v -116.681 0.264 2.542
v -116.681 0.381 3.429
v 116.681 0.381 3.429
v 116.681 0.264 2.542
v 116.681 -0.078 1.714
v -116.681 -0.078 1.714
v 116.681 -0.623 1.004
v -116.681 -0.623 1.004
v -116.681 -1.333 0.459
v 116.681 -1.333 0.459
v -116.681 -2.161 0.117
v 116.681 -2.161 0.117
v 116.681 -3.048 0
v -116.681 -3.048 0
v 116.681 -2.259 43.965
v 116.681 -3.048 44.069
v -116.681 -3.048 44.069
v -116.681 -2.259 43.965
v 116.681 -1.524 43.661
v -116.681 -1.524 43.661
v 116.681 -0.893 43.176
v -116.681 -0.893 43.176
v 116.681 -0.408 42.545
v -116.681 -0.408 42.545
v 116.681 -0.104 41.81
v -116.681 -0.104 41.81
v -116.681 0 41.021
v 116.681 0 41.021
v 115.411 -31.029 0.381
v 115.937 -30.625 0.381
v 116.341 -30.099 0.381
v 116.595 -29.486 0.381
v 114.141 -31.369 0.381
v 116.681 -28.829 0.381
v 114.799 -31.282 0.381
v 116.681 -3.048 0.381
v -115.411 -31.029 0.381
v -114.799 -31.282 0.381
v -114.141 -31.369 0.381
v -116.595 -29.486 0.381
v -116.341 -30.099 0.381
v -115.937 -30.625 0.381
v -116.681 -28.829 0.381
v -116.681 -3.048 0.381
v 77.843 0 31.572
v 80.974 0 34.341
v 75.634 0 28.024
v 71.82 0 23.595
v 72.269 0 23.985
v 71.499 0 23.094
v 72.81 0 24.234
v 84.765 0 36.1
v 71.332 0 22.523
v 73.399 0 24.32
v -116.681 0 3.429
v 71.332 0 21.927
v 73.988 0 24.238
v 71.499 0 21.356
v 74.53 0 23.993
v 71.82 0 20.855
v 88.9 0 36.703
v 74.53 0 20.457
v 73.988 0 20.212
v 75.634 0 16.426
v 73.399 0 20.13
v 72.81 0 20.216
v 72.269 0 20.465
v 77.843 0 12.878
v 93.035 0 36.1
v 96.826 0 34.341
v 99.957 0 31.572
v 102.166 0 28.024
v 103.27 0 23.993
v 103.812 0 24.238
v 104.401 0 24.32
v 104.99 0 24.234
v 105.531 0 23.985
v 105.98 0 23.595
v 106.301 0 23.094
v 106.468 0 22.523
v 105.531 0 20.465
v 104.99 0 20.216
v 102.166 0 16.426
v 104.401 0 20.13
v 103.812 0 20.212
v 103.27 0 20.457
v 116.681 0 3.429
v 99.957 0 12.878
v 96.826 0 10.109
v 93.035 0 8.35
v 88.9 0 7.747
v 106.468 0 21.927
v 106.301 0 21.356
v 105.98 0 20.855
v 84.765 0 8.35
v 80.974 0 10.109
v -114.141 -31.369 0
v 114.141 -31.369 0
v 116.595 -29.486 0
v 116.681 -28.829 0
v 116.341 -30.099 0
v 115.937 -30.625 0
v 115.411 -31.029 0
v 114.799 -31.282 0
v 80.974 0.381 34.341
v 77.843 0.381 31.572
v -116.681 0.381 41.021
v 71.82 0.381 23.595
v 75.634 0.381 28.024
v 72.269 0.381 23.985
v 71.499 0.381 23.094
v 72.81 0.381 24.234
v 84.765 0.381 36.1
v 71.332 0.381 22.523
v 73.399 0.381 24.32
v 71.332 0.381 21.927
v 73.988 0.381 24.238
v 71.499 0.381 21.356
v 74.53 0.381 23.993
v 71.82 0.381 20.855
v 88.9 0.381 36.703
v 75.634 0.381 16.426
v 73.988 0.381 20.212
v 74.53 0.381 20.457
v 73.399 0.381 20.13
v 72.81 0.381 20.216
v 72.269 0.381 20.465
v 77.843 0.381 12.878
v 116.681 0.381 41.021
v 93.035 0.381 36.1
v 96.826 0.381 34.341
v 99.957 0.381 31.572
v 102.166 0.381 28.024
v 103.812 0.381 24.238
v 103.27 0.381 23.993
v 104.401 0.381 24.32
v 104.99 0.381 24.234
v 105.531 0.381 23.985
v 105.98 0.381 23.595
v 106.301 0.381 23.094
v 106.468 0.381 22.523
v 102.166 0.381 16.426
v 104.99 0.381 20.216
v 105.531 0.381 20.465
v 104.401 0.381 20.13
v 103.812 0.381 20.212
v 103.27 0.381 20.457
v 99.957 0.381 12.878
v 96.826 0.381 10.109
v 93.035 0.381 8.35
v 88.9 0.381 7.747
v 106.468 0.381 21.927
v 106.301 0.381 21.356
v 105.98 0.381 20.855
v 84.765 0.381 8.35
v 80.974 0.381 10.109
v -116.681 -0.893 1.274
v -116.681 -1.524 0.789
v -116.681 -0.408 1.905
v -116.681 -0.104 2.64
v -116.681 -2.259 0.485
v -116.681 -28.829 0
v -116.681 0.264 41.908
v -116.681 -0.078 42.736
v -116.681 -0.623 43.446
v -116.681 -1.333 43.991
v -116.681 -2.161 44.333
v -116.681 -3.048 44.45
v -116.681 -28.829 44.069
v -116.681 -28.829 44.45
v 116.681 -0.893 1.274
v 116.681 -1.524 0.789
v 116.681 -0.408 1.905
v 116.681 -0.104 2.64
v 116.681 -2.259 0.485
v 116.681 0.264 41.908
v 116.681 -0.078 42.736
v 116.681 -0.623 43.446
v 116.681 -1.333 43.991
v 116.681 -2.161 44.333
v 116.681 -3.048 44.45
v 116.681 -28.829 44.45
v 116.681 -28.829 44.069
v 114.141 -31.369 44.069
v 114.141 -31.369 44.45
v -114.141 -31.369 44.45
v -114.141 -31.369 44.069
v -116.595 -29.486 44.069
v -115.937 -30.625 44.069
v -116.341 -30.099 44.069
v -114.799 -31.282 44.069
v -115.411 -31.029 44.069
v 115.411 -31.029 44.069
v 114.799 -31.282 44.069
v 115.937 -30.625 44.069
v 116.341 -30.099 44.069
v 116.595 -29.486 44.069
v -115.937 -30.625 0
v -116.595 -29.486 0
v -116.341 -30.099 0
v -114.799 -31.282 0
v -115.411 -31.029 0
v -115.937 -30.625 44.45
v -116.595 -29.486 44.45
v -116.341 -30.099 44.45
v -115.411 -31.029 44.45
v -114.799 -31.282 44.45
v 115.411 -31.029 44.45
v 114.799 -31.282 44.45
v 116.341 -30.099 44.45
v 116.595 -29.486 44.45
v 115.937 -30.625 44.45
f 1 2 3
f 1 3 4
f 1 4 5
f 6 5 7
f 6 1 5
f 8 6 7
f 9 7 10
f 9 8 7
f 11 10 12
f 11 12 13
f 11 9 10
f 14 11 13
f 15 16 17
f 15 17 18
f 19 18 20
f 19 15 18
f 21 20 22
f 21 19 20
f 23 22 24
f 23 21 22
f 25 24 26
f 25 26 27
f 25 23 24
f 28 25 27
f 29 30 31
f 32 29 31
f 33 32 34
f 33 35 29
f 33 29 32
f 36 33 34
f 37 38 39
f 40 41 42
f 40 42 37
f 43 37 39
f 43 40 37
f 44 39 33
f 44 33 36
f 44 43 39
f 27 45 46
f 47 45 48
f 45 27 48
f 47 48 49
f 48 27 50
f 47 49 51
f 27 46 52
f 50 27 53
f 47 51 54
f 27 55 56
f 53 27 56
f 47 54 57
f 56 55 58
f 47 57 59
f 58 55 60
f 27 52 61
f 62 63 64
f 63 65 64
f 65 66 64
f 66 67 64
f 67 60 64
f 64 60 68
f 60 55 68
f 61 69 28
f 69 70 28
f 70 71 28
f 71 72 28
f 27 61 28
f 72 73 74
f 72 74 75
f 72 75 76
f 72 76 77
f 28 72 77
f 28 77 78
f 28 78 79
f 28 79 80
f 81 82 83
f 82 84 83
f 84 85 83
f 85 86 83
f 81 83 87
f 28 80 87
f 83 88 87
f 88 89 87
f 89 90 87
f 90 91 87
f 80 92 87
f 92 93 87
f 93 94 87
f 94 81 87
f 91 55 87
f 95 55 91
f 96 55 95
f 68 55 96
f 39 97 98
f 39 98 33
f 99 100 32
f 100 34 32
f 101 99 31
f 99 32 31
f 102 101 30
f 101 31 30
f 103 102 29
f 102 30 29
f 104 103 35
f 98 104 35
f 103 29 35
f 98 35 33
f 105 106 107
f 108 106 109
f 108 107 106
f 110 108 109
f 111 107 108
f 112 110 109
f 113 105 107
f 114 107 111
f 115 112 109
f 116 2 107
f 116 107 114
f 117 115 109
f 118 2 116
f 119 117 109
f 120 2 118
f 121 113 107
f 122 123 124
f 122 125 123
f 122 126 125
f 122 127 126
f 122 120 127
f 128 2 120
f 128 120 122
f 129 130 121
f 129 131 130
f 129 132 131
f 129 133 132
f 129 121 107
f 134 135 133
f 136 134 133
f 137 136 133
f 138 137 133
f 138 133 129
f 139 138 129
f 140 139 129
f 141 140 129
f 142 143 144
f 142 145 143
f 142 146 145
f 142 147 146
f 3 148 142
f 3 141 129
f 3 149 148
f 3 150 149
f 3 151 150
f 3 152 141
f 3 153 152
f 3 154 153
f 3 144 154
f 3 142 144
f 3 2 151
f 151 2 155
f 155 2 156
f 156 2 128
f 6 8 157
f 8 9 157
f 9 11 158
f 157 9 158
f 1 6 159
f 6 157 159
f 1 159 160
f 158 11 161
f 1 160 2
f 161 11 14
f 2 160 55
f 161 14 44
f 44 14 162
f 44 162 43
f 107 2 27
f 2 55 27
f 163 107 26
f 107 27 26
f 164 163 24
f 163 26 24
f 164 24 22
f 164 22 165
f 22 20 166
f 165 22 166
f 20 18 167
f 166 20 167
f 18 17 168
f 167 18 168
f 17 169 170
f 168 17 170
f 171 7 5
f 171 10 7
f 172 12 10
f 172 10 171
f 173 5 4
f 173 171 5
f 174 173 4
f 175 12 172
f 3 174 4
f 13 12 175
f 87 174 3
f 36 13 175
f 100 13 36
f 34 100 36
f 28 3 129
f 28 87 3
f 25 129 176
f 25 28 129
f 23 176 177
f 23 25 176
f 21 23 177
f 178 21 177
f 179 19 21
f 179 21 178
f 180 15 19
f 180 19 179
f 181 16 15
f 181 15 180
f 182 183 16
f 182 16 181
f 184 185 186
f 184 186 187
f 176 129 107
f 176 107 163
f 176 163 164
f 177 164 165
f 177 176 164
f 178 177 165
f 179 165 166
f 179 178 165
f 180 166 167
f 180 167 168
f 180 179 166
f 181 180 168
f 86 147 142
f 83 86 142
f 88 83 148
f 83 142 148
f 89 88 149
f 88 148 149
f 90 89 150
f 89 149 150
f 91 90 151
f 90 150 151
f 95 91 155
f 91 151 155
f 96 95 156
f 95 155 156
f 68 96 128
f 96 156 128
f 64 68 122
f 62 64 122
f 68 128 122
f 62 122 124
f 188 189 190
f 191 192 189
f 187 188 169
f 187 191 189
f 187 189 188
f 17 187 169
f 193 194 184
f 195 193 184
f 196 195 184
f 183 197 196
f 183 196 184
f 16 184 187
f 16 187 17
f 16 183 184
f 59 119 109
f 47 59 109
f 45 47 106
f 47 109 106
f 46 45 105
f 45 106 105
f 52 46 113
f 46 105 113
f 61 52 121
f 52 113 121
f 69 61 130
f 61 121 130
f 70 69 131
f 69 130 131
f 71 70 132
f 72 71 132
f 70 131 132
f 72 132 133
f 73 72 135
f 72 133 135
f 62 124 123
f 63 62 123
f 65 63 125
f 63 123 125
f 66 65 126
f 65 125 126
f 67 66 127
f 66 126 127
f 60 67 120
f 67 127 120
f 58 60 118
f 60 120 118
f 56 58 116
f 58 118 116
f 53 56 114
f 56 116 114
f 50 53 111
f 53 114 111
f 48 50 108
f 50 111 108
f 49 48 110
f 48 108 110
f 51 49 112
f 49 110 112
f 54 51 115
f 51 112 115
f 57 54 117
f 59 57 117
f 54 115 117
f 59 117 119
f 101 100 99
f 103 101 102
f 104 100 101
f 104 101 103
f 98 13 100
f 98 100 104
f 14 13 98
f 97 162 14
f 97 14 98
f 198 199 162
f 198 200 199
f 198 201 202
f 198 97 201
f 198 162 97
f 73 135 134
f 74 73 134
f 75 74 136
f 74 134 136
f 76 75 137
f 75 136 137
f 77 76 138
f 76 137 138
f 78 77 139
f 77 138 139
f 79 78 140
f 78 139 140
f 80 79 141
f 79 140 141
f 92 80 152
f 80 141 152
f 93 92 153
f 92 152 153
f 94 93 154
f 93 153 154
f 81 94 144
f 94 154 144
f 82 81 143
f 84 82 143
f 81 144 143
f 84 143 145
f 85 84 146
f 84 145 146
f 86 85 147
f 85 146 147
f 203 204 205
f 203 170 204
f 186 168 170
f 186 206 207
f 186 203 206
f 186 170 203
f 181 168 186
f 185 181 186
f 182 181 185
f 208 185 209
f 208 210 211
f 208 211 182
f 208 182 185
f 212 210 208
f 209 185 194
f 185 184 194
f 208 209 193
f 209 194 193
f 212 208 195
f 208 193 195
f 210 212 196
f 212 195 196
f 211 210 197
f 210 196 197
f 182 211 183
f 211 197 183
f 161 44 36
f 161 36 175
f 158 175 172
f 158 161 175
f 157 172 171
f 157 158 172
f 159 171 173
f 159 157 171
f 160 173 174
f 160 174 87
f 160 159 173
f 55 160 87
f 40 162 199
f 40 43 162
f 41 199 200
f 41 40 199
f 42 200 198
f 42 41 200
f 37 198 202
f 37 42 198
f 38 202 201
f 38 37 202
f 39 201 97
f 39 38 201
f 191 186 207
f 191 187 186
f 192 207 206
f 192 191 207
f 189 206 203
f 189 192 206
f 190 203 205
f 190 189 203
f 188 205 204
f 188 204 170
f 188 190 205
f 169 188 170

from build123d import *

# Parameters (mm, degrees)
SKETCH1_W                      = 233.3625
SKETCH1_H                      = 0.381
BASE_FLANGE1_DEPTH             = 44.45
EDGE_FLANGE1_STRIP_W           = 7.62
EDGE_FLANGE1_STRIP_H           = 0.381
EDGE_FLANGE1_STRIP_CUT_DEPTH   = 233.3625
EDGE_FLANGE1_STRIP_2_W         = 7.62
EDGE_FLANGE1_STRIP_2_H         = 0.381
EDGE_FLANGE1_STRIP_CUT_2_DEPTH = 233.3625
EDGE_FLANGE1_DEPTH             = 233.3625
EDGE_FLANGE1_BEND_DEPTH        = 233.3625
CUT_EXTRUDE1_DEPTH             = 129.834696808
FILLET1_R                      = 2.54


# Sheet-metal steps are written as plain solids
with BuildPart() as part:
    # Sketch1 → Base-Flange1 (new body)
    with BuildSketch(Plane.XY):
        with Locations((0, 0.1905)):
            Rectangle(SKETCH1_W, SKETCH1_H)
    extrude(amount=BASE_FLANGE1_DEPTH)

    # Edge-Flange1 strip (across the edge) → Edge-Flange1 strip cut (cut)
    with BuildSketch(Plane(origin=(-116.68125, 0, 0), x_dir=(0, 0, 1), z_dir=(1, 0, 0))):
        with Locations((-0.381, -0.1905)):
            Rectangle(EDGE_FLANGE1_STRIP_W, EDGE_FLANGE1_STRIP_H)
    extrude(amount=EDGE_FLANGE1_STRIP_CUT_DEPTH, mode=Mode.SUBTRACT)

    # Edge-Flange1 strip 2 (across the edge) → Edge-Flange1 strip cut 2 (cut)
    with BuildSketch(Plane(origin=(116.68125, 0, 44.45), x_dir=(0, 0, -1), z_dir=(-1, 0, 0))):
        with Locations((-0.381, -0.1905)):
            Rectangle(EDGE_FLANGE1_STRIP_2_W, EDGE_FLANGE1_STRIP_2_H)
    extrude(amount=EDGE_FLANGE1_STRIP_CUT_2_DEPTH, mode=Mode.SUBTRACT)

    # Edge-Flange1 section (across the edge) → Edge-Flange1 (add)
    with BuildSketch(Plane(origin=(-116.68125, 0, 0), x_dir=(0, 0, 1), z_dir=(1, 0, 0))):
        with BuildLine():
            Line((0, 3.048), (0, 31.369))
            Line((0, 31.369), (0.381, 31.369))
            Line((0.381, 31.369), (0.381, 3.048))
            ThreePointArc((0.381, 3.048), (1.273738531, 0.892738531), (3.429, 0))
            Line((3.429, 0), (3.429, -0.381))
            ThreePointArc((3.429, -0.381), (1.004330847, 0.623330847), (0, 3.048))
        make_face()
    extrude(amount=EDGE_FLANGE1_DEPTH)

    # Edge-Flange1 section 2 (across the edge) → Edge-Flange1 bend (add)
    with BuildSketch(Plane(origin=(116.68125, 0, 44.45), x_dir=(0, 0, -1), z_dir=(-1, 0, 0))):
        with BuildLine():
            Line((0, 3.048), (0, 31.369))
            Line((0, 31.369), (0.381, 31.369))
            Line((0.381, 31.369), (0.381, 3.048))
            ThreePointArc((0.381, 3.048), (1.273738531, 0.892738531), (3.429, 0))
            Line((3.429, 0), (3.429, -0.381))
            ThreePointArc((3.429, -0.381), (1.004330847, 0.623330847), (0, 3.048))
        make_face()
    extrude(amount=EDGE_FLANGE1_BEND_DEPTH)

    # Sketch18 → Cut-Extrude1 (cut, through all)
    with BuildSketch(Plane(origin=(0, 0.381, 0), x_dir=(1, 0, 0), z_dir=(0, 1, 0))):
        with BuildLine():
            ThreePointArc((74.530392418, -23.993293511), (88.9, -36.703), (103.269607582, -23.993293511))
            ThreePointArc((103.269607582, -23.993293511), (106.4895, -22.225), (103.269607582, -20.456706489))
            ThreePointArc((103.269607582, -20.456706489), (88.9, -7.747), (74.530392418, -20.456706489))
            ThreePointArc((74.530392418, -20.456706489), (71.3105, -22.225), (74.530392418, -23.993293511))
        make_face()
    extrude(amount=-CUT_EXTRUDE1_DEPTH, mode=Mode.SUBTRACT)

    # Fillet1
    fillet1_edges = [part.edges().sort_by_distance(p)[0] for p in [
        (-116.68125, -31.369, 0.1905),
        (116.68125, -31.369, 0.1905),
        (116.68125, -31.369, 44.2595),
        (-116.68125, -31.369, 44.2595),
    ]]
    fillet(fillet1_edges, radius=FILLET1_R)


solid = part.part
